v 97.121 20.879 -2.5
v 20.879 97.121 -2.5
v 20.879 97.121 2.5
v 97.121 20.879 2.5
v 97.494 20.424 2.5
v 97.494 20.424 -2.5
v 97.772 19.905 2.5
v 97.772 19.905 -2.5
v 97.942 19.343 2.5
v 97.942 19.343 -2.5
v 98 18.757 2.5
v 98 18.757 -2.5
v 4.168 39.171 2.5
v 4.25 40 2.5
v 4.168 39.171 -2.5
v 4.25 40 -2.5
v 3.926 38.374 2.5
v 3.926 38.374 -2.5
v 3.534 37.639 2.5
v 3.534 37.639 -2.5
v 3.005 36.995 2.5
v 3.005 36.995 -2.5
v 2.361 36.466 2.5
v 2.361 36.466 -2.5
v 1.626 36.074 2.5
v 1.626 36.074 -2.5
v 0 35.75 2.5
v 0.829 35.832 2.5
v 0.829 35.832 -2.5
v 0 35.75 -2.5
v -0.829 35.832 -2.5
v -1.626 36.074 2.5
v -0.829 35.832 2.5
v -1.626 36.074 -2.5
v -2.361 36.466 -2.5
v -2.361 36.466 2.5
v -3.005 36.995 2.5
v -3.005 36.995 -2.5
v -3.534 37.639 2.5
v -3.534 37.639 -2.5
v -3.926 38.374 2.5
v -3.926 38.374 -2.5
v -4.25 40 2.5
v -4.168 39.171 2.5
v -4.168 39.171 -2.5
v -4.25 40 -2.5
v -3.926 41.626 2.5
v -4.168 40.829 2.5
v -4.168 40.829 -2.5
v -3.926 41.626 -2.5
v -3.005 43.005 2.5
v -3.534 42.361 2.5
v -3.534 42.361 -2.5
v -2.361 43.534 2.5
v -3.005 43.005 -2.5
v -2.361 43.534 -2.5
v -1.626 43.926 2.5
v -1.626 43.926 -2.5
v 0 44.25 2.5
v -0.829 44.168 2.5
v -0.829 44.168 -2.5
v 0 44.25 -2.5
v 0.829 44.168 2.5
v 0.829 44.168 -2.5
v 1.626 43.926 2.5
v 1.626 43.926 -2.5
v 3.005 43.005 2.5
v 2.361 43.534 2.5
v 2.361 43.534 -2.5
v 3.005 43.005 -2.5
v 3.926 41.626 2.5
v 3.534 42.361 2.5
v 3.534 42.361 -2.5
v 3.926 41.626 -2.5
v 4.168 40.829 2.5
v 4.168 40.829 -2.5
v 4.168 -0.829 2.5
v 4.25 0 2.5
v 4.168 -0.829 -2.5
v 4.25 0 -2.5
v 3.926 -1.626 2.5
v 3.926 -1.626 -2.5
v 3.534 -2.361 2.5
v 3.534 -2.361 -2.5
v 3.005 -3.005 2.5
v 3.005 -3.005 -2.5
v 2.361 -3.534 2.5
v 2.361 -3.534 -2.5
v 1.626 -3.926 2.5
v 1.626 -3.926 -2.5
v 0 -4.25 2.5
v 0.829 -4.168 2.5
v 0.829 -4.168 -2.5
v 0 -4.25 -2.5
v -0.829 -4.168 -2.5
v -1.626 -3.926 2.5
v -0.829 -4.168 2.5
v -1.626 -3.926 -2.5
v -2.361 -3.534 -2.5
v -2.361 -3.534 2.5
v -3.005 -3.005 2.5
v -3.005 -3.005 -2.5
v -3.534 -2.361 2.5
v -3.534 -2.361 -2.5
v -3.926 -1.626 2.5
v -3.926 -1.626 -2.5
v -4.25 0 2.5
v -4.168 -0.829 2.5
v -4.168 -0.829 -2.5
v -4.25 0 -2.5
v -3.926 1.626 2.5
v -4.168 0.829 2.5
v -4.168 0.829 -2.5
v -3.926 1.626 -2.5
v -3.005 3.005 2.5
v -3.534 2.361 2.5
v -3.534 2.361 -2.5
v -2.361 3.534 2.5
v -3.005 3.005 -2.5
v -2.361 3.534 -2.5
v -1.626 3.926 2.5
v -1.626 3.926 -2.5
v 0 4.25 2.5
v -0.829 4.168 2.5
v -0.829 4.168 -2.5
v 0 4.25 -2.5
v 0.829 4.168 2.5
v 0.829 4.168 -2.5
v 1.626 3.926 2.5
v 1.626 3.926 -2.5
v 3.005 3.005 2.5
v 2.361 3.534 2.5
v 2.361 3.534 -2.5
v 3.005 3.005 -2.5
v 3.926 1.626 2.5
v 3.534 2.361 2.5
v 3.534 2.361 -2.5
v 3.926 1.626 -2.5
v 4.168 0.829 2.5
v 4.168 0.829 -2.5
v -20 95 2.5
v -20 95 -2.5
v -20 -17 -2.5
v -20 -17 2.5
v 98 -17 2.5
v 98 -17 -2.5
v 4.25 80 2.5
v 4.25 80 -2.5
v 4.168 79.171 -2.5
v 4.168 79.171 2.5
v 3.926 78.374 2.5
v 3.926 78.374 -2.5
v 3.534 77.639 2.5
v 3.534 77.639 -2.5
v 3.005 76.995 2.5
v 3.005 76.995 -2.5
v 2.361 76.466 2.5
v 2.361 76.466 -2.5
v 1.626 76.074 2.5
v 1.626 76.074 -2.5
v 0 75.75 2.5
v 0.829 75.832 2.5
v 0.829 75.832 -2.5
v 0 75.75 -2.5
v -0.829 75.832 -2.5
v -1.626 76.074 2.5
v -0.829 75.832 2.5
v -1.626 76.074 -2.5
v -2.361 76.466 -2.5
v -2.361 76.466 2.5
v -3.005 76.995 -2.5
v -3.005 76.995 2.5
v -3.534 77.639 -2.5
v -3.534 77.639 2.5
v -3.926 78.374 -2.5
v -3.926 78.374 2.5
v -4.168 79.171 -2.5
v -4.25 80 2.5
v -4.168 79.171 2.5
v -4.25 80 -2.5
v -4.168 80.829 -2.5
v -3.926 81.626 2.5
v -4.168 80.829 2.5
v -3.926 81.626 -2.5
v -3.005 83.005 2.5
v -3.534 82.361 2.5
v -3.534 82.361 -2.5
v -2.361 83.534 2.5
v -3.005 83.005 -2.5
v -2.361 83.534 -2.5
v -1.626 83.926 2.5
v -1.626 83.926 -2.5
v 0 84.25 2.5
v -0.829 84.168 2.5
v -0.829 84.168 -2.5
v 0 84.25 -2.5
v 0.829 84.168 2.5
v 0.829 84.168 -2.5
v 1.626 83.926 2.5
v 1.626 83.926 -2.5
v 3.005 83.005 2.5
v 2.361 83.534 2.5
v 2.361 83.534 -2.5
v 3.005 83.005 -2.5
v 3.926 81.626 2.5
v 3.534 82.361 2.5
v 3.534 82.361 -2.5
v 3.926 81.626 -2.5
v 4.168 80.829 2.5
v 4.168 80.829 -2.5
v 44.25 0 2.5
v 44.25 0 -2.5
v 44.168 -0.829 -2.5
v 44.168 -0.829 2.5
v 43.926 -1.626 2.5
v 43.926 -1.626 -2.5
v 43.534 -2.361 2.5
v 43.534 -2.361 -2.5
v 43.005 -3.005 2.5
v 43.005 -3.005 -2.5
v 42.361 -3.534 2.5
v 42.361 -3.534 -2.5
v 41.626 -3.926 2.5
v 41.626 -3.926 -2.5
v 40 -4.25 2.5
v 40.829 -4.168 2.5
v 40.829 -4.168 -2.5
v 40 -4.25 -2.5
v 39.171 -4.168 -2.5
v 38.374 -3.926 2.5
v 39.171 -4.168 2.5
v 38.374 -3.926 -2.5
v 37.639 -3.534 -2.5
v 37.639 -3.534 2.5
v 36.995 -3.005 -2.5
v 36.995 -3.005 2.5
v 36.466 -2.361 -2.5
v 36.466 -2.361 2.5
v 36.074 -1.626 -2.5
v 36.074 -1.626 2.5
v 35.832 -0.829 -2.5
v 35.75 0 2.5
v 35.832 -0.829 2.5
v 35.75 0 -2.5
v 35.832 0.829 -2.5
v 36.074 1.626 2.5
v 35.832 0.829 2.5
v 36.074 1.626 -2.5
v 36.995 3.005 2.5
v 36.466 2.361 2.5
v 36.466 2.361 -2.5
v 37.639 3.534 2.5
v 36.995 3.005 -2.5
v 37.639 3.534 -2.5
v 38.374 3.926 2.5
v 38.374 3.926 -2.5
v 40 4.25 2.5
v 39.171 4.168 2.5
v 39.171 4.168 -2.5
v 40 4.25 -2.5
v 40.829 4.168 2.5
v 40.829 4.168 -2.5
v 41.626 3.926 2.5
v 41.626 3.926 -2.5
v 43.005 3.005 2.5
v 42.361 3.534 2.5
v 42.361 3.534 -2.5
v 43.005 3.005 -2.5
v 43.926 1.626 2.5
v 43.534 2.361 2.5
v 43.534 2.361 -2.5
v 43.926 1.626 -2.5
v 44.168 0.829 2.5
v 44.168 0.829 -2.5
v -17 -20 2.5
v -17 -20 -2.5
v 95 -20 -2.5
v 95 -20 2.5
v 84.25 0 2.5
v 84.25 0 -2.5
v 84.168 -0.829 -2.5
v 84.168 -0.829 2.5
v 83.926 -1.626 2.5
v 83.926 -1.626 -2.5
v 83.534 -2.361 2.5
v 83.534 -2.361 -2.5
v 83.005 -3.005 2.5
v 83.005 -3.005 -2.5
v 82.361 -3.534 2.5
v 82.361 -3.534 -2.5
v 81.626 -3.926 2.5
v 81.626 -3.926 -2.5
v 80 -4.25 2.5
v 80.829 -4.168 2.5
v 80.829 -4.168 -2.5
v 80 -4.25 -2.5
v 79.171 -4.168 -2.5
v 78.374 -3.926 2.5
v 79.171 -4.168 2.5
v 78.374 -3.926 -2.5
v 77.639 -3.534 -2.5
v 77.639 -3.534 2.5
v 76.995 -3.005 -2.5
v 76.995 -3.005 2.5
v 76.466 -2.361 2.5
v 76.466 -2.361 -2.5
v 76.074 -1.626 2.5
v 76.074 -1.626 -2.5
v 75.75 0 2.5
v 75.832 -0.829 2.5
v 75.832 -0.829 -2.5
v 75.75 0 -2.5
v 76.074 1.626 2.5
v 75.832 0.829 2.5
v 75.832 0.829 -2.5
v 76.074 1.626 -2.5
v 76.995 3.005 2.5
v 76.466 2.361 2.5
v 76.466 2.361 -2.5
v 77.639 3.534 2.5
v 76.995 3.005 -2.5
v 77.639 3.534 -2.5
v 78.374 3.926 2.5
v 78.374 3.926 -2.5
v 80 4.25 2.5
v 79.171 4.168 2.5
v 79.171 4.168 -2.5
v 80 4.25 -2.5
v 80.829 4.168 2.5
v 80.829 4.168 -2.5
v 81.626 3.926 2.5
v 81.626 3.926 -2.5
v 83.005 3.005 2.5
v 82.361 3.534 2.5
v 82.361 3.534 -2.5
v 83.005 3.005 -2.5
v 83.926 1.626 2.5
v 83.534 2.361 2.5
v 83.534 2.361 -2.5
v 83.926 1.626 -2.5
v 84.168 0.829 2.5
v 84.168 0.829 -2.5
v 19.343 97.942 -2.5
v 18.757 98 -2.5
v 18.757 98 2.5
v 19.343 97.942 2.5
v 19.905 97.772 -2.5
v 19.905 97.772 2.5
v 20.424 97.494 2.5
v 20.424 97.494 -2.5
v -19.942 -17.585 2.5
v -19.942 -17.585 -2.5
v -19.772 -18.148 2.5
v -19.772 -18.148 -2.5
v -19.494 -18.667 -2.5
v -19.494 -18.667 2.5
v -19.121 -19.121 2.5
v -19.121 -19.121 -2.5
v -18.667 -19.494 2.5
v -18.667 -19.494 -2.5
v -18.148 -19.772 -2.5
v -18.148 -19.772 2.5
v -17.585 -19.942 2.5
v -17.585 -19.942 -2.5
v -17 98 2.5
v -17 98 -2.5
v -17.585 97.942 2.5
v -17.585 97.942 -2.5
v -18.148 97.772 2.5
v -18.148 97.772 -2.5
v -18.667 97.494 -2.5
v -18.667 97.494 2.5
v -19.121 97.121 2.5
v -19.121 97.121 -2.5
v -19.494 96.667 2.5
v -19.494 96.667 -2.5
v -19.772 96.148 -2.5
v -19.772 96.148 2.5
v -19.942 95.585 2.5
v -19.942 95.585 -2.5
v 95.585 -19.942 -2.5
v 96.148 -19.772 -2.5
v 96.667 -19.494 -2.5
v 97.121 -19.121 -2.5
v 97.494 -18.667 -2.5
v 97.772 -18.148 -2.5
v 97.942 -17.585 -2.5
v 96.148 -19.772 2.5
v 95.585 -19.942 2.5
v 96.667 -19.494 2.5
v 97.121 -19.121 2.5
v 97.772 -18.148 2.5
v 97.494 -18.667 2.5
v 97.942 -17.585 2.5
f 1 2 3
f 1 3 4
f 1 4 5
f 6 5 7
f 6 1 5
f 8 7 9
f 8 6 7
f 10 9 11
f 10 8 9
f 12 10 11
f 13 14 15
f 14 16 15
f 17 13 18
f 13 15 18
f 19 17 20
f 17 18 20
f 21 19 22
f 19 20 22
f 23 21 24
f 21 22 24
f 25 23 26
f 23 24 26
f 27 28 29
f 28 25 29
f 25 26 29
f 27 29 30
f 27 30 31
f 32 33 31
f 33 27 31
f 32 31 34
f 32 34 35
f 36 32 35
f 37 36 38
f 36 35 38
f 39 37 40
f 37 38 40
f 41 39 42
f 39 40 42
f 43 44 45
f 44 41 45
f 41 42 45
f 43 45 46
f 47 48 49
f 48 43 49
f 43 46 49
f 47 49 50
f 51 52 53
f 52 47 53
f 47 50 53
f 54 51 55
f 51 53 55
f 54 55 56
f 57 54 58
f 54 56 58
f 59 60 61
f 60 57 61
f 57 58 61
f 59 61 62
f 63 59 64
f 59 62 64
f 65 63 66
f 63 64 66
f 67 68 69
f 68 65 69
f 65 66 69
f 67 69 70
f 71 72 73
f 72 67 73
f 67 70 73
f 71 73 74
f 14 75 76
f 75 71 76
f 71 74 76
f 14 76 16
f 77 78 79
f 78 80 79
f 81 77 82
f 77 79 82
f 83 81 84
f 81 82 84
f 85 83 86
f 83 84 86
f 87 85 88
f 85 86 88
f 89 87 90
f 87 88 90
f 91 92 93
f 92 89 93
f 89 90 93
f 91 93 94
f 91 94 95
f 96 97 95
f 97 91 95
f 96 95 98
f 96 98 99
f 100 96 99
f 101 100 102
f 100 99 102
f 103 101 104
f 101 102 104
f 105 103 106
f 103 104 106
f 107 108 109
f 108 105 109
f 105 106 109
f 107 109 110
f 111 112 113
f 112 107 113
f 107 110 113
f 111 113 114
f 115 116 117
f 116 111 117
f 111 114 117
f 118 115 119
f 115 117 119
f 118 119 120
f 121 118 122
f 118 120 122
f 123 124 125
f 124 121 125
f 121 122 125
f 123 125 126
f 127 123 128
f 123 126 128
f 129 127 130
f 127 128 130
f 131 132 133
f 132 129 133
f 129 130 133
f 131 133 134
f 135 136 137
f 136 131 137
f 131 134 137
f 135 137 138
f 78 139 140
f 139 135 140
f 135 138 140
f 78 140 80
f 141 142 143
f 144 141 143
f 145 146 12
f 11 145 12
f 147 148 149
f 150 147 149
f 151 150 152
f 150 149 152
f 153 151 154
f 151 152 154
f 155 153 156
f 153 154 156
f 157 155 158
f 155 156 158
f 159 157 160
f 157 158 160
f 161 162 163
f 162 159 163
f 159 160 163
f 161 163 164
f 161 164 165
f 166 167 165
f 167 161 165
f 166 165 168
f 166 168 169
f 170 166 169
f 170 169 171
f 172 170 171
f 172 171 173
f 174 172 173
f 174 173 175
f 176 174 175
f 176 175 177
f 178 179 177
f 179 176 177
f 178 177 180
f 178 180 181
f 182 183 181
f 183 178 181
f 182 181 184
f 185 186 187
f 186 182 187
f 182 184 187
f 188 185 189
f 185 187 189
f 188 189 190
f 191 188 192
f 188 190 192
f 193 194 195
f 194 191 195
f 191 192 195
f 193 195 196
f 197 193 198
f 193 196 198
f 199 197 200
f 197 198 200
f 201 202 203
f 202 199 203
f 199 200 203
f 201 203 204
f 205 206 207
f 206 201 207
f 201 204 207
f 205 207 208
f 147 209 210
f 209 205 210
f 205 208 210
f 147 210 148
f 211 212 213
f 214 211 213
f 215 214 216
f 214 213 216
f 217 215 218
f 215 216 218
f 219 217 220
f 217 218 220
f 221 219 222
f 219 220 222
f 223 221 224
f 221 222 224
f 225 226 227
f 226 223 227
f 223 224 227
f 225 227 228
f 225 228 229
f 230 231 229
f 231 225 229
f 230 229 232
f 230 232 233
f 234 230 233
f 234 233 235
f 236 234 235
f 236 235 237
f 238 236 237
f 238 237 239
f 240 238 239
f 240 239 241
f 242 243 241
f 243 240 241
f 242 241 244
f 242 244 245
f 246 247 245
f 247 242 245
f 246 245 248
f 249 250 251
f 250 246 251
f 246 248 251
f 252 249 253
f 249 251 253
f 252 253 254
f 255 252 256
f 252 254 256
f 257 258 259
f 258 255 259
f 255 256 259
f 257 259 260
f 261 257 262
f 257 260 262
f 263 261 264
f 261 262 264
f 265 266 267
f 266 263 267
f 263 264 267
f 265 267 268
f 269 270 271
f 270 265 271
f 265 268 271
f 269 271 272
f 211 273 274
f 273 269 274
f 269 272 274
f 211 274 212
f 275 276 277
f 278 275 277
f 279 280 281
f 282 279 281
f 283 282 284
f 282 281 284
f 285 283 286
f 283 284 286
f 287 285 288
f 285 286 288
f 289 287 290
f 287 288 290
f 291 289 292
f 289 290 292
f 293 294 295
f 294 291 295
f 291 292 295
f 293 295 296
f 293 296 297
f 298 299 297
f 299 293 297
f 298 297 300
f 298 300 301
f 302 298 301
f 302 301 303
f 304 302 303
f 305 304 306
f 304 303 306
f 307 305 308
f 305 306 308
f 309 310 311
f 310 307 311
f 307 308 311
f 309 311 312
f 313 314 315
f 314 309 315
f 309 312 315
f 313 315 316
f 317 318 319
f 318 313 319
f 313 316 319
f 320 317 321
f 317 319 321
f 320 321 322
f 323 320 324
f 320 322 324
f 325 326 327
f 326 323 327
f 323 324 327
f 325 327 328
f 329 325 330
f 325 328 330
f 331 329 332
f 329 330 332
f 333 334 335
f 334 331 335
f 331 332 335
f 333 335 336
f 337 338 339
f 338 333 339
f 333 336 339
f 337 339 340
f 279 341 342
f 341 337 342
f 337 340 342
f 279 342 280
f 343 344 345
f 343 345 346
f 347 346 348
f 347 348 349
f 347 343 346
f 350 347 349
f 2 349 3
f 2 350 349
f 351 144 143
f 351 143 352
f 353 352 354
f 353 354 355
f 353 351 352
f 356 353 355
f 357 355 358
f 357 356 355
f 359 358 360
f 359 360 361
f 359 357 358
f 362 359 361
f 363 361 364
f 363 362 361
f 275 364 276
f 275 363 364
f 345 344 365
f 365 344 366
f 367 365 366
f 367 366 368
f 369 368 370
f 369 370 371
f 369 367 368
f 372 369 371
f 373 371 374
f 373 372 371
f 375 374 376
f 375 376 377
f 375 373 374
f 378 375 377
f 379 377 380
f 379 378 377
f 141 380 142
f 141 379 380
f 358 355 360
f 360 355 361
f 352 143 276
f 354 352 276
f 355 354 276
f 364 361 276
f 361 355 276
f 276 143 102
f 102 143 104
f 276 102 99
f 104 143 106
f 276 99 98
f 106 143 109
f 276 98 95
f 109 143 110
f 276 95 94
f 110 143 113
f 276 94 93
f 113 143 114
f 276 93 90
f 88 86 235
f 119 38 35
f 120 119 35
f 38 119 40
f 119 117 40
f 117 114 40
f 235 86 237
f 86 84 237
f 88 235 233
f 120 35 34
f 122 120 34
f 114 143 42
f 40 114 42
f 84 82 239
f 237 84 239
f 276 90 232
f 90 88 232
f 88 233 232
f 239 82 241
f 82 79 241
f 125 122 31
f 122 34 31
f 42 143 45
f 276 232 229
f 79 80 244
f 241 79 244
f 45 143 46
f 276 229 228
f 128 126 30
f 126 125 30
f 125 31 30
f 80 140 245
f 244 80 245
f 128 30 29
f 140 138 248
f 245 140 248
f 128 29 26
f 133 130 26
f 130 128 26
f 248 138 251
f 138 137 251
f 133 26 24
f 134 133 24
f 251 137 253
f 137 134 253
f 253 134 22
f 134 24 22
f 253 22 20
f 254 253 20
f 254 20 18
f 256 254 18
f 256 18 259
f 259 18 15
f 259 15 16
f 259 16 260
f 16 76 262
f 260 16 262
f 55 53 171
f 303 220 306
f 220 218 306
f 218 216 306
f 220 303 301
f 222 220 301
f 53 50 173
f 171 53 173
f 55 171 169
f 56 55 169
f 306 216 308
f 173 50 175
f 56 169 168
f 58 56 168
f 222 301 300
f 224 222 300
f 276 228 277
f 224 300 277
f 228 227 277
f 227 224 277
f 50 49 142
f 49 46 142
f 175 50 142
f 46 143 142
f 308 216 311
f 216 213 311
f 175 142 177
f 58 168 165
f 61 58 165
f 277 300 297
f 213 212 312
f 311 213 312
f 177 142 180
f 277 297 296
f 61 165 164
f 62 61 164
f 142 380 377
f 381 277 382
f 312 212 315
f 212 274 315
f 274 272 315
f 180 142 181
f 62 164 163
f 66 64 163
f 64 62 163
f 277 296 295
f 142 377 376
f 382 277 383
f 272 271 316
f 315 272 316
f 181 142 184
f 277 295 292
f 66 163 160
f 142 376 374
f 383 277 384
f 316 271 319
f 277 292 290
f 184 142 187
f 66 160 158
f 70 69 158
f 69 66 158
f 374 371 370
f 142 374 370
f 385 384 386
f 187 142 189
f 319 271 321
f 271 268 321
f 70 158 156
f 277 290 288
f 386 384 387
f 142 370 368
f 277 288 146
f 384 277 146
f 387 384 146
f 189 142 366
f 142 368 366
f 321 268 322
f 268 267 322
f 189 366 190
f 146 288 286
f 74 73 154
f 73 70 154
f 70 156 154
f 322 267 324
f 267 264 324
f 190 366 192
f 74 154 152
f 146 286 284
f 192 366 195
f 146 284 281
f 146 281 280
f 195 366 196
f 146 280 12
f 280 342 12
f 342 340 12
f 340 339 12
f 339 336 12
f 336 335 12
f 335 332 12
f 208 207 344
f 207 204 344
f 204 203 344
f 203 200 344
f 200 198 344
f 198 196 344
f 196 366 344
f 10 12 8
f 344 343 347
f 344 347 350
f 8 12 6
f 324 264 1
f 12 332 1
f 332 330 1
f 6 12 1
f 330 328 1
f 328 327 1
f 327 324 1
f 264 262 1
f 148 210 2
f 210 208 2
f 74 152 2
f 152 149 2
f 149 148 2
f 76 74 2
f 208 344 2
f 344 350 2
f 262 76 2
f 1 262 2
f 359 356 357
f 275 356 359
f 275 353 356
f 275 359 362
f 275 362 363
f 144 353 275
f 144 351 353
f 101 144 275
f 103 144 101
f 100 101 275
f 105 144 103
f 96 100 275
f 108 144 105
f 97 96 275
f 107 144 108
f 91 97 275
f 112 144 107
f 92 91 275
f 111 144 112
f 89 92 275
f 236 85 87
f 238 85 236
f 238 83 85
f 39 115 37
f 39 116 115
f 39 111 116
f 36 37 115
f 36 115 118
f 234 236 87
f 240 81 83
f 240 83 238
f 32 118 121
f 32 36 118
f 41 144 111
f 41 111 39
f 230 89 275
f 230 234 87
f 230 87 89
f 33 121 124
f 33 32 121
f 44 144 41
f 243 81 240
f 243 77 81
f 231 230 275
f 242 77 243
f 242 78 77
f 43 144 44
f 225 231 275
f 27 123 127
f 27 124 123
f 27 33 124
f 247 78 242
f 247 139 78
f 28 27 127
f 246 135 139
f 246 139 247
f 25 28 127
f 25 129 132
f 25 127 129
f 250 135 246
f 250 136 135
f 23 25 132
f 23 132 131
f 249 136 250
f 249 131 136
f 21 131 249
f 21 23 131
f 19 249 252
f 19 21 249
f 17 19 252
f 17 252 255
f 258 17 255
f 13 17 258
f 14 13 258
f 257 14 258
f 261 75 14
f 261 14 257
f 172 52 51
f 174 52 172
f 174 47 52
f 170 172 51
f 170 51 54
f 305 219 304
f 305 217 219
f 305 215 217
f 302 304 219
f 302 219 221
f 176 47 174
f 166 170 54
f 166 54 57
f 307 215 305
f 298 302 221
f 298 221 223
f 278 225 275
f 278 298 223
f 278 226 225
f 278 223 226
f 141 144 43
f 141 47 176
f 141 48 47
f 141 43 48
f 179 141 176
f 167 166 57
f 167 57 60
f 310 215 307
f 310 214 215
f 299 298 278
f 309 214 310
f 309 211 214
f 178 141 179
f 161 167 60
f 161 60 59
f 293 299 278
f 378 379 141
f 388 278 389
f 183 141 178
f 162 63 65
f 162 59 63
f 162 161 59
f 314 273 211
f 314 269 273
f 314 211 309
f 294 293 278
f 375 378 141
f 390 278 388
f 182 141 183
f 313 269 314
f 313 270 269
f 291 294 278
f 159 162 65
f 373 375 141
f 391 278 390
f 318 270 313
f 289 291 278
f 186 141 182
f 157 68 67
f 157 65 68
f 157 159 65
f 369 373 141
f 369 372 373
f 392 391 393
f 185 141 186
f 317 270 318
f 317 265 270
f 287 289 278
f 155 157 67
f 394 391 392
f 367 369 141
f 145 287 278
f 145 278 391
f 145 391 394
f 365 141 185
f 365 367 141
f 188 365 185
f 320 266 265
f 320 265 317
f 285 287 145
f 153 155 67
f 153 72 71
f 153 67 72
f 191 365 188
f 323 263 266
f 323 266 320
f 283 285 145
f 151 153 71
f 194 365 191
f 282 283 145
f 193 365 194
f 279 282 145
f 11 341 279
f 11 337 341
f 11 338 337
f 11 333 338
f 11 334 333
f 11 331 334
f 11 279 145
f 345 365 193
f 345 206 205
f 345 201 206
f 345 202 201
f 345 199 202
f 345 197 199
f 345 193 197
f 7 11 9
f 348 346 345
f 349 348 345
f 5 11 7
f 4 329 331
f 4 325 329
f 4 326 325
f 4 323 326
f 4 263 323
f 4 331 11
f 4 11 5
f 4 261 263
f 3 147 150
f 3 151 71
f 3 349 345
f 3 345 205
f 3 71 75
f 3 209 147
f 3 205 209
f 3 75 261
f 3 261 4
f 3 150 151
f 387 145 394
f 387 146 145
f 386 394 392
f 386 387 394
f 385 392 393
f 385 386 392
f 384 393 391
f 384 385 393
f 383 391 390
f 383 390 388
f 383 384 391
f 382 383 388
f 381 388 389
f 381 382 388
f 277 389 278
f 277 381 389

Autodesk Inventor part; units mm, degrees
ref_plane "YZ Plane" through (0, 0, 0) normal (1, 0, 0) x (0, 1, 0)
ref_plane "XZ Plane" through (0, 0, 0) normal (0, 1, 0) x (-1, 0, 0)
ref_plane "XY Plane" through (0, 0, 0) normal (0, 0, 1) x (1, 0, 0)
sketch "Sketch1" plane through (0, 0, 0) normal (0, 0, 1) x (1, 0, 0)
  circle A0 centre (0, 0) radius 4.25
  circle A1 centre (40, 0) radius 4.25
  circle A2 centre (80, 0) radius 4.25
  circle A3 centre (0, 40) radius 4.25
  circle A4 centre (0, 80) radius 4.25
  line L0 (0, 0) -> (0, 80) construction
  line L1 (0, 0) -> (80, 0) construction
  line L2 (-20, 98) -> (-20, -20)
  line L3 (-20, -20) -> (98, -20)
  line L4 (98, -20) -> (98, 98)
  line L5 (98, 98) -> (-20, 98)
  line L6 (20, 98) -> (98, 20)
  dimension "d0" = 8.5
  dimension "d1" = 8.5
  dimension "d2" = 8.5
  dimension "d3" = 8.5
  dimension "d4" = 8.5
  dimension "d5" = 80
  dimension "d6" = 80
  dimension "d7" = 118
  dimension "d8" = 118
  dimension "d9" = 20
  dimension "d10" = 20
  dimension "d11" = 40
  dimension "d12" = 40
extrude "Extrusion1" add sketch "Sketch1" along normal mid plane 5 contours L5 L6 L4 L3 L2
fillet "Fillet1" radius 3 5 edges at (-20, 98, 0) (20, 98, 0) (-20, -20, 0) (98, 20, 0) (98, -20, 0)
equation "\"d1\" = d0"
equation "\"d2\" = d0"
equation "\"d3\" = d0"
equation "\"d4\" = d0"
equation "\"d6\" = d5"
properties part number "Connection_plate_L_120x120" material "Aluminum 6061"
